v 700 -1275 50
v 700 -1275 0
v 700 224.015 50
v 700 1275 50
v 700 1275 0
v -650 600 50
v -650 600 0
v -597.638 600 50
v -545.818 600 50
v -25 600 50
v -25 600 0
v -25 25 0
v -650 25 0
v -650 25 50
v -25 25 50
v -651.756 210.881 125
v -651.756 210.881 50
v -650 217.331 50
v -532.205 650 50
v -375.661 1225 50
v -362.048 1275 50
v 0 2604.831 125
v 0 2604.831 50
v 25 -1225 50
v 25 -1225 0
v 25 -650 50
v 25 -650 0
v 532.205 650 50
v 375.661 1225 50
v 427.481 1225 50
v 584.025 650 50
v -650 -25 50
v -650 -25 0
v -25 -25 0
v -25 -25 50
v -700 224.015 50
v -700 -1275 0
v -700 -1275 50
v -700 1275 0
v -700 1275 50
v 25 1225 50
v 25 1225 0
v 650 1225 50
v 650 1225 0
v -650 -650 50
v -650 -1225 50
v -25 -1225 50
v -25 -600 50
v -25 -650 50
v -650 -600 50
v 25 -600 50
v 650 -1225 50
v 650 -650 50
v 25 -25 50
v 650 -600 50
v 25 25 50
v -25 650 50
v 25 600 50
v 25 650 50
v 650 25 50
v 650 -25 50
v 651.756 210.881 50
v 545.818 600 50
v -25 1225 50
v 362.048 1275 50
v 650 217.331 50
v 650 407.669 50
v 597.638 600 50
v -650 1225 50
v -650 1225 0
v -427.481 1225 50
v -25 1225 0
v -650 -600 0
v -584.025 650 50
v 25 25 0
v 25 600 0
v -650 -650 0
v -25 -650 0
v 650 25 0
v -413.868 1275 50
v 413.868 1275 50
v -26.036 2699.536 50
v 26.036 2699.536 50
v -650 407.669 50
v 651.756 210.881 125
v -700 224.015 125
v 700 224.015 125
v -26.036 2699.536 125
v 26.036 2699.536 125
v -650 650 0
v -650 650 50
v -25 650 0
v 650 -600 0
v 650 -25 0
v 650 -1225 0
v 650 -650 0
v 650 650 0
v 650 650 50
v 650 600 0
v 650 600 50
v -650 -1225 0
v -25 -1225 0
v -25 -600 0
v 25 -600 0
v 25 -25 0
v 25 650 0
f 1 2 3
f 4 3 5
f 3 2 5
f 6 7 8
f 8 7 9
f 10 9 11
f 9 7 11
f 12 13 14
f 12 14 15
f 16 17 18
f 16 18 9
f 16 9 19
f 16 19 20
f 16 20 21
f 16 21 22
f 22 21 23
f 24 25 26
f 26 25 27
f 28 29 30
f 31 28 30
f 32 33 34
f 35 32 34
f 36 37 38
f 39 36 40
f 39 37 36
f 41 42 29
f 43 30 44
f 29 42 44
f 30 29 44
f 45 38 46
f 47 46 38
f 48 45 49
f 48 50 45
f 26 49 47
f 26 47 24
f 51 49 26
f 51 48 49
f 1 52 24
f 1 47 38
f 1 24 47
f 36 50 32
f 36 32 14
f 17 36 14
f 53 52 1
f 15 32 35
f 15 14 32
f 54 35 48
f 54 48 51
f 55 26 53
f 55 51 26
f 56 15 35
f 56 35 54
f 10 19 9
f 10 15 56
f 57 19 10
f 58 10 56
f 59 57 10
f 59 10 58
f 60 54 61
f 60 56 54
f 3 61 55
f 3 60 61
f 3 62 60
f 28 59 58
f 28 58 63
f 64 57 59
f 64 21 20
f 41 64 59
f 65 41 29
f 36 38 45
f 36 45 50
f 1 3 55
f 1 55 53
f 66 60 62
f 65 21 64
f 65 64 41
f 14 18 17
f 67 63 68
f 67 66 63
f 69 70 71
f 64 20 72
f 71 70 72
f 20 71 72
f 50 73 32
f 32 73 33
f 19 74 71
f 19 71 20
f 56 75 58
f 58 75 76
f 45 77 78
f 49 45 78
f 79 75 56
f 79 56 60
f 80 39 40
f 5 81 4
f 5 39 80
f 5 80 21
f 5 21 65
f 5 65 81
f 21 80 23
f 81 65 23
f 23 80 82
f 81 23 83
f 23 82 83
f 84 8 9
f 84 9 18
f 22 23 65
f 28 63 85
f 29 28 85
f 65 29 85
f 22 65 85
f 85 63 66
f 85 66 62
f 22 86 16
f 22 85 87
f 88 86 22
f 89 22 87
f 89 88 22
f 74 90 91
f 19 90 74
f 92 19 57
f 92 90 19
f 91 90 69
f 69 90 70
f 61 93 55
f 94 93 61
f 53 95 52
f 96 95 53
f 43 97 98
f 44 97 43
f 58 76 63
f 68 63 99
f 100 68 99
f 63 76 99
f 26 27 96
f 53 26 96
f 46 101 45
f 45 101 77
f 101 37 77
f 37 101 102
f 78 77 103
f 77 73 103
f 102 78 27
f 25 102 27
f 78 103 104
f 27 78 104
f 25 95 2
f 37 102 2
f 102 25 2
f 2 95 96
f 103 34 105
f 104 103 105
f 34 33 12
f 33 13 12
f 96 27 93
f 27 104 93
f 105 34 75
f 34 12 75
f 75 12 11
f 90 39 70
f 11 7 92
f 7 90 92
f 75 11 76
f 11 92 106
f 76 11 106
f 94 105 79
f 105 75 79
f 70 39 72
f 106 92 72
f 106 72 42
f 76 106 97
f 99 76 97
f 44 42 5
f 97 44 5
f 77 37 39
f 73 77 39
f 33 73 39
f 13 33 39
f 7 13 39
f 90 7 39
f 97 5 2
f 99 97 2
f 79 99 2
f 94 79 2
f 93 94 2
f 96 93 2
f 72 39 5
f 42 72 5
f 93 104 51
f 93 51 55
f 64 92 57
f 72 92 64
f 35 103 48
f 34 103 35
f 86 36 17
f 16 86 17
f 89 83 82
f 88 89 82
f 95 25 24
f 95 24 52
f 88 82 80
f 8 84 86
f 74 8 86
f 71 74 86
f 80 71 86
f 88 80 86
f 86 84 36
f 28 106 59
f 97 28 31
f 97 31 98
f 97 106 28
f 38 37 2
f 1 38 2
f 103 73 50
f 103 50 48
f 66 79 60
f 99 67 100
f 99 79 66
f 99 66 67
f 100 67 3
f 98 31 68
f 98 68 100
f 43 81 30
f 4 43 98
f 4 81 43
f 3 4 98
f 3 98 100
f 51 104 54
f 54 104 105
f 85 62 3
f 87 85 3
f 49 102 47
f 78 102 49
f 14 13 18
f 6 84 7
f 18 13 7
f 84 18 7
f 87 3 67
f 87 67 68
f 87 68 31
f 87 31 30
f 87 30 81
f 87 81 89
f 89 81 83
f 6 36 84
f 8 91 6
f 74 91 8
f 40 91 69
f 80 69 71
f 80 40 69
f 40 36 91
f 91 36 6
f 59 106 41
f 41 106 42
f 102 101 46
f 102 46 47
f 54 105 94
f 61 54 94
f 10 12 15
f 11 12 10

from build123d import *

# Parameters (mm, degrees)
F0_W     = 1400
F0_H     = 2550
F0_W_2   = 625
F0_H_2   = 575
F1_DEPTH = 50
F3_DEPTH = 75


with BuildPart() as f1:
    # F0 (on Top) → F1 (new body)
    with BuildSketch(Plane.XY):
        Rectangle(F0_W, F0_H)
        with Locations((-337.5, -937.5)):
            Rectangle(F0_W_2, F0_H_2, mode=Mode.SUBTRACT)
        with Locations((-337.5, -312.5)):
            Rectangle(F0_W_2, F0_H_2, mode=Mode.SUBTRACT)
        with Locations((337.5, -937.5)):
            Rectangle(F0_W_2, F0_H_2, mode=Mode.SUBTRACT)
        with Locations((337.5, -312.5)):
            Rectangle(F0_W_2, F0_H_2, mode=Mode.SUBTRACT)
        with Locations((-337.5, 312.5)):
            Rectangle(F0_W_2, F0_H_2, mode=Mode.SUBTRACT)
        with Locations((-337.5, 937.5)):
            Rectangle(F0_W_2, F0_H_2, mode=Mode.SUBTRACT)
        with Locations((337.5, 312.5)):
            Rectangle(F0_W_2, F0_H_2, mode=Mode.SUBTRACT)
        with Locations((337.5, 937.5)):
            Rectangle(F0_W_2, F0_H_2, mode=Mode.SUBTRACT)
    extrude(amount=F1_DEPTH)

    # F2 (on face) → F3 (join)
    with BuildSketch(Plane.XY.offset(50)):
        Polygon((-26.03622, 2699.536199), (-700, 224.015392), (-651.755985, 210.880895), (0, 2604.830762), (651.755985, 210.880895), (700, 224.015392), (26.03622, 2699.536199), align=None)
    extrude(amount=F3_DEPTH)


solid = f1.part
